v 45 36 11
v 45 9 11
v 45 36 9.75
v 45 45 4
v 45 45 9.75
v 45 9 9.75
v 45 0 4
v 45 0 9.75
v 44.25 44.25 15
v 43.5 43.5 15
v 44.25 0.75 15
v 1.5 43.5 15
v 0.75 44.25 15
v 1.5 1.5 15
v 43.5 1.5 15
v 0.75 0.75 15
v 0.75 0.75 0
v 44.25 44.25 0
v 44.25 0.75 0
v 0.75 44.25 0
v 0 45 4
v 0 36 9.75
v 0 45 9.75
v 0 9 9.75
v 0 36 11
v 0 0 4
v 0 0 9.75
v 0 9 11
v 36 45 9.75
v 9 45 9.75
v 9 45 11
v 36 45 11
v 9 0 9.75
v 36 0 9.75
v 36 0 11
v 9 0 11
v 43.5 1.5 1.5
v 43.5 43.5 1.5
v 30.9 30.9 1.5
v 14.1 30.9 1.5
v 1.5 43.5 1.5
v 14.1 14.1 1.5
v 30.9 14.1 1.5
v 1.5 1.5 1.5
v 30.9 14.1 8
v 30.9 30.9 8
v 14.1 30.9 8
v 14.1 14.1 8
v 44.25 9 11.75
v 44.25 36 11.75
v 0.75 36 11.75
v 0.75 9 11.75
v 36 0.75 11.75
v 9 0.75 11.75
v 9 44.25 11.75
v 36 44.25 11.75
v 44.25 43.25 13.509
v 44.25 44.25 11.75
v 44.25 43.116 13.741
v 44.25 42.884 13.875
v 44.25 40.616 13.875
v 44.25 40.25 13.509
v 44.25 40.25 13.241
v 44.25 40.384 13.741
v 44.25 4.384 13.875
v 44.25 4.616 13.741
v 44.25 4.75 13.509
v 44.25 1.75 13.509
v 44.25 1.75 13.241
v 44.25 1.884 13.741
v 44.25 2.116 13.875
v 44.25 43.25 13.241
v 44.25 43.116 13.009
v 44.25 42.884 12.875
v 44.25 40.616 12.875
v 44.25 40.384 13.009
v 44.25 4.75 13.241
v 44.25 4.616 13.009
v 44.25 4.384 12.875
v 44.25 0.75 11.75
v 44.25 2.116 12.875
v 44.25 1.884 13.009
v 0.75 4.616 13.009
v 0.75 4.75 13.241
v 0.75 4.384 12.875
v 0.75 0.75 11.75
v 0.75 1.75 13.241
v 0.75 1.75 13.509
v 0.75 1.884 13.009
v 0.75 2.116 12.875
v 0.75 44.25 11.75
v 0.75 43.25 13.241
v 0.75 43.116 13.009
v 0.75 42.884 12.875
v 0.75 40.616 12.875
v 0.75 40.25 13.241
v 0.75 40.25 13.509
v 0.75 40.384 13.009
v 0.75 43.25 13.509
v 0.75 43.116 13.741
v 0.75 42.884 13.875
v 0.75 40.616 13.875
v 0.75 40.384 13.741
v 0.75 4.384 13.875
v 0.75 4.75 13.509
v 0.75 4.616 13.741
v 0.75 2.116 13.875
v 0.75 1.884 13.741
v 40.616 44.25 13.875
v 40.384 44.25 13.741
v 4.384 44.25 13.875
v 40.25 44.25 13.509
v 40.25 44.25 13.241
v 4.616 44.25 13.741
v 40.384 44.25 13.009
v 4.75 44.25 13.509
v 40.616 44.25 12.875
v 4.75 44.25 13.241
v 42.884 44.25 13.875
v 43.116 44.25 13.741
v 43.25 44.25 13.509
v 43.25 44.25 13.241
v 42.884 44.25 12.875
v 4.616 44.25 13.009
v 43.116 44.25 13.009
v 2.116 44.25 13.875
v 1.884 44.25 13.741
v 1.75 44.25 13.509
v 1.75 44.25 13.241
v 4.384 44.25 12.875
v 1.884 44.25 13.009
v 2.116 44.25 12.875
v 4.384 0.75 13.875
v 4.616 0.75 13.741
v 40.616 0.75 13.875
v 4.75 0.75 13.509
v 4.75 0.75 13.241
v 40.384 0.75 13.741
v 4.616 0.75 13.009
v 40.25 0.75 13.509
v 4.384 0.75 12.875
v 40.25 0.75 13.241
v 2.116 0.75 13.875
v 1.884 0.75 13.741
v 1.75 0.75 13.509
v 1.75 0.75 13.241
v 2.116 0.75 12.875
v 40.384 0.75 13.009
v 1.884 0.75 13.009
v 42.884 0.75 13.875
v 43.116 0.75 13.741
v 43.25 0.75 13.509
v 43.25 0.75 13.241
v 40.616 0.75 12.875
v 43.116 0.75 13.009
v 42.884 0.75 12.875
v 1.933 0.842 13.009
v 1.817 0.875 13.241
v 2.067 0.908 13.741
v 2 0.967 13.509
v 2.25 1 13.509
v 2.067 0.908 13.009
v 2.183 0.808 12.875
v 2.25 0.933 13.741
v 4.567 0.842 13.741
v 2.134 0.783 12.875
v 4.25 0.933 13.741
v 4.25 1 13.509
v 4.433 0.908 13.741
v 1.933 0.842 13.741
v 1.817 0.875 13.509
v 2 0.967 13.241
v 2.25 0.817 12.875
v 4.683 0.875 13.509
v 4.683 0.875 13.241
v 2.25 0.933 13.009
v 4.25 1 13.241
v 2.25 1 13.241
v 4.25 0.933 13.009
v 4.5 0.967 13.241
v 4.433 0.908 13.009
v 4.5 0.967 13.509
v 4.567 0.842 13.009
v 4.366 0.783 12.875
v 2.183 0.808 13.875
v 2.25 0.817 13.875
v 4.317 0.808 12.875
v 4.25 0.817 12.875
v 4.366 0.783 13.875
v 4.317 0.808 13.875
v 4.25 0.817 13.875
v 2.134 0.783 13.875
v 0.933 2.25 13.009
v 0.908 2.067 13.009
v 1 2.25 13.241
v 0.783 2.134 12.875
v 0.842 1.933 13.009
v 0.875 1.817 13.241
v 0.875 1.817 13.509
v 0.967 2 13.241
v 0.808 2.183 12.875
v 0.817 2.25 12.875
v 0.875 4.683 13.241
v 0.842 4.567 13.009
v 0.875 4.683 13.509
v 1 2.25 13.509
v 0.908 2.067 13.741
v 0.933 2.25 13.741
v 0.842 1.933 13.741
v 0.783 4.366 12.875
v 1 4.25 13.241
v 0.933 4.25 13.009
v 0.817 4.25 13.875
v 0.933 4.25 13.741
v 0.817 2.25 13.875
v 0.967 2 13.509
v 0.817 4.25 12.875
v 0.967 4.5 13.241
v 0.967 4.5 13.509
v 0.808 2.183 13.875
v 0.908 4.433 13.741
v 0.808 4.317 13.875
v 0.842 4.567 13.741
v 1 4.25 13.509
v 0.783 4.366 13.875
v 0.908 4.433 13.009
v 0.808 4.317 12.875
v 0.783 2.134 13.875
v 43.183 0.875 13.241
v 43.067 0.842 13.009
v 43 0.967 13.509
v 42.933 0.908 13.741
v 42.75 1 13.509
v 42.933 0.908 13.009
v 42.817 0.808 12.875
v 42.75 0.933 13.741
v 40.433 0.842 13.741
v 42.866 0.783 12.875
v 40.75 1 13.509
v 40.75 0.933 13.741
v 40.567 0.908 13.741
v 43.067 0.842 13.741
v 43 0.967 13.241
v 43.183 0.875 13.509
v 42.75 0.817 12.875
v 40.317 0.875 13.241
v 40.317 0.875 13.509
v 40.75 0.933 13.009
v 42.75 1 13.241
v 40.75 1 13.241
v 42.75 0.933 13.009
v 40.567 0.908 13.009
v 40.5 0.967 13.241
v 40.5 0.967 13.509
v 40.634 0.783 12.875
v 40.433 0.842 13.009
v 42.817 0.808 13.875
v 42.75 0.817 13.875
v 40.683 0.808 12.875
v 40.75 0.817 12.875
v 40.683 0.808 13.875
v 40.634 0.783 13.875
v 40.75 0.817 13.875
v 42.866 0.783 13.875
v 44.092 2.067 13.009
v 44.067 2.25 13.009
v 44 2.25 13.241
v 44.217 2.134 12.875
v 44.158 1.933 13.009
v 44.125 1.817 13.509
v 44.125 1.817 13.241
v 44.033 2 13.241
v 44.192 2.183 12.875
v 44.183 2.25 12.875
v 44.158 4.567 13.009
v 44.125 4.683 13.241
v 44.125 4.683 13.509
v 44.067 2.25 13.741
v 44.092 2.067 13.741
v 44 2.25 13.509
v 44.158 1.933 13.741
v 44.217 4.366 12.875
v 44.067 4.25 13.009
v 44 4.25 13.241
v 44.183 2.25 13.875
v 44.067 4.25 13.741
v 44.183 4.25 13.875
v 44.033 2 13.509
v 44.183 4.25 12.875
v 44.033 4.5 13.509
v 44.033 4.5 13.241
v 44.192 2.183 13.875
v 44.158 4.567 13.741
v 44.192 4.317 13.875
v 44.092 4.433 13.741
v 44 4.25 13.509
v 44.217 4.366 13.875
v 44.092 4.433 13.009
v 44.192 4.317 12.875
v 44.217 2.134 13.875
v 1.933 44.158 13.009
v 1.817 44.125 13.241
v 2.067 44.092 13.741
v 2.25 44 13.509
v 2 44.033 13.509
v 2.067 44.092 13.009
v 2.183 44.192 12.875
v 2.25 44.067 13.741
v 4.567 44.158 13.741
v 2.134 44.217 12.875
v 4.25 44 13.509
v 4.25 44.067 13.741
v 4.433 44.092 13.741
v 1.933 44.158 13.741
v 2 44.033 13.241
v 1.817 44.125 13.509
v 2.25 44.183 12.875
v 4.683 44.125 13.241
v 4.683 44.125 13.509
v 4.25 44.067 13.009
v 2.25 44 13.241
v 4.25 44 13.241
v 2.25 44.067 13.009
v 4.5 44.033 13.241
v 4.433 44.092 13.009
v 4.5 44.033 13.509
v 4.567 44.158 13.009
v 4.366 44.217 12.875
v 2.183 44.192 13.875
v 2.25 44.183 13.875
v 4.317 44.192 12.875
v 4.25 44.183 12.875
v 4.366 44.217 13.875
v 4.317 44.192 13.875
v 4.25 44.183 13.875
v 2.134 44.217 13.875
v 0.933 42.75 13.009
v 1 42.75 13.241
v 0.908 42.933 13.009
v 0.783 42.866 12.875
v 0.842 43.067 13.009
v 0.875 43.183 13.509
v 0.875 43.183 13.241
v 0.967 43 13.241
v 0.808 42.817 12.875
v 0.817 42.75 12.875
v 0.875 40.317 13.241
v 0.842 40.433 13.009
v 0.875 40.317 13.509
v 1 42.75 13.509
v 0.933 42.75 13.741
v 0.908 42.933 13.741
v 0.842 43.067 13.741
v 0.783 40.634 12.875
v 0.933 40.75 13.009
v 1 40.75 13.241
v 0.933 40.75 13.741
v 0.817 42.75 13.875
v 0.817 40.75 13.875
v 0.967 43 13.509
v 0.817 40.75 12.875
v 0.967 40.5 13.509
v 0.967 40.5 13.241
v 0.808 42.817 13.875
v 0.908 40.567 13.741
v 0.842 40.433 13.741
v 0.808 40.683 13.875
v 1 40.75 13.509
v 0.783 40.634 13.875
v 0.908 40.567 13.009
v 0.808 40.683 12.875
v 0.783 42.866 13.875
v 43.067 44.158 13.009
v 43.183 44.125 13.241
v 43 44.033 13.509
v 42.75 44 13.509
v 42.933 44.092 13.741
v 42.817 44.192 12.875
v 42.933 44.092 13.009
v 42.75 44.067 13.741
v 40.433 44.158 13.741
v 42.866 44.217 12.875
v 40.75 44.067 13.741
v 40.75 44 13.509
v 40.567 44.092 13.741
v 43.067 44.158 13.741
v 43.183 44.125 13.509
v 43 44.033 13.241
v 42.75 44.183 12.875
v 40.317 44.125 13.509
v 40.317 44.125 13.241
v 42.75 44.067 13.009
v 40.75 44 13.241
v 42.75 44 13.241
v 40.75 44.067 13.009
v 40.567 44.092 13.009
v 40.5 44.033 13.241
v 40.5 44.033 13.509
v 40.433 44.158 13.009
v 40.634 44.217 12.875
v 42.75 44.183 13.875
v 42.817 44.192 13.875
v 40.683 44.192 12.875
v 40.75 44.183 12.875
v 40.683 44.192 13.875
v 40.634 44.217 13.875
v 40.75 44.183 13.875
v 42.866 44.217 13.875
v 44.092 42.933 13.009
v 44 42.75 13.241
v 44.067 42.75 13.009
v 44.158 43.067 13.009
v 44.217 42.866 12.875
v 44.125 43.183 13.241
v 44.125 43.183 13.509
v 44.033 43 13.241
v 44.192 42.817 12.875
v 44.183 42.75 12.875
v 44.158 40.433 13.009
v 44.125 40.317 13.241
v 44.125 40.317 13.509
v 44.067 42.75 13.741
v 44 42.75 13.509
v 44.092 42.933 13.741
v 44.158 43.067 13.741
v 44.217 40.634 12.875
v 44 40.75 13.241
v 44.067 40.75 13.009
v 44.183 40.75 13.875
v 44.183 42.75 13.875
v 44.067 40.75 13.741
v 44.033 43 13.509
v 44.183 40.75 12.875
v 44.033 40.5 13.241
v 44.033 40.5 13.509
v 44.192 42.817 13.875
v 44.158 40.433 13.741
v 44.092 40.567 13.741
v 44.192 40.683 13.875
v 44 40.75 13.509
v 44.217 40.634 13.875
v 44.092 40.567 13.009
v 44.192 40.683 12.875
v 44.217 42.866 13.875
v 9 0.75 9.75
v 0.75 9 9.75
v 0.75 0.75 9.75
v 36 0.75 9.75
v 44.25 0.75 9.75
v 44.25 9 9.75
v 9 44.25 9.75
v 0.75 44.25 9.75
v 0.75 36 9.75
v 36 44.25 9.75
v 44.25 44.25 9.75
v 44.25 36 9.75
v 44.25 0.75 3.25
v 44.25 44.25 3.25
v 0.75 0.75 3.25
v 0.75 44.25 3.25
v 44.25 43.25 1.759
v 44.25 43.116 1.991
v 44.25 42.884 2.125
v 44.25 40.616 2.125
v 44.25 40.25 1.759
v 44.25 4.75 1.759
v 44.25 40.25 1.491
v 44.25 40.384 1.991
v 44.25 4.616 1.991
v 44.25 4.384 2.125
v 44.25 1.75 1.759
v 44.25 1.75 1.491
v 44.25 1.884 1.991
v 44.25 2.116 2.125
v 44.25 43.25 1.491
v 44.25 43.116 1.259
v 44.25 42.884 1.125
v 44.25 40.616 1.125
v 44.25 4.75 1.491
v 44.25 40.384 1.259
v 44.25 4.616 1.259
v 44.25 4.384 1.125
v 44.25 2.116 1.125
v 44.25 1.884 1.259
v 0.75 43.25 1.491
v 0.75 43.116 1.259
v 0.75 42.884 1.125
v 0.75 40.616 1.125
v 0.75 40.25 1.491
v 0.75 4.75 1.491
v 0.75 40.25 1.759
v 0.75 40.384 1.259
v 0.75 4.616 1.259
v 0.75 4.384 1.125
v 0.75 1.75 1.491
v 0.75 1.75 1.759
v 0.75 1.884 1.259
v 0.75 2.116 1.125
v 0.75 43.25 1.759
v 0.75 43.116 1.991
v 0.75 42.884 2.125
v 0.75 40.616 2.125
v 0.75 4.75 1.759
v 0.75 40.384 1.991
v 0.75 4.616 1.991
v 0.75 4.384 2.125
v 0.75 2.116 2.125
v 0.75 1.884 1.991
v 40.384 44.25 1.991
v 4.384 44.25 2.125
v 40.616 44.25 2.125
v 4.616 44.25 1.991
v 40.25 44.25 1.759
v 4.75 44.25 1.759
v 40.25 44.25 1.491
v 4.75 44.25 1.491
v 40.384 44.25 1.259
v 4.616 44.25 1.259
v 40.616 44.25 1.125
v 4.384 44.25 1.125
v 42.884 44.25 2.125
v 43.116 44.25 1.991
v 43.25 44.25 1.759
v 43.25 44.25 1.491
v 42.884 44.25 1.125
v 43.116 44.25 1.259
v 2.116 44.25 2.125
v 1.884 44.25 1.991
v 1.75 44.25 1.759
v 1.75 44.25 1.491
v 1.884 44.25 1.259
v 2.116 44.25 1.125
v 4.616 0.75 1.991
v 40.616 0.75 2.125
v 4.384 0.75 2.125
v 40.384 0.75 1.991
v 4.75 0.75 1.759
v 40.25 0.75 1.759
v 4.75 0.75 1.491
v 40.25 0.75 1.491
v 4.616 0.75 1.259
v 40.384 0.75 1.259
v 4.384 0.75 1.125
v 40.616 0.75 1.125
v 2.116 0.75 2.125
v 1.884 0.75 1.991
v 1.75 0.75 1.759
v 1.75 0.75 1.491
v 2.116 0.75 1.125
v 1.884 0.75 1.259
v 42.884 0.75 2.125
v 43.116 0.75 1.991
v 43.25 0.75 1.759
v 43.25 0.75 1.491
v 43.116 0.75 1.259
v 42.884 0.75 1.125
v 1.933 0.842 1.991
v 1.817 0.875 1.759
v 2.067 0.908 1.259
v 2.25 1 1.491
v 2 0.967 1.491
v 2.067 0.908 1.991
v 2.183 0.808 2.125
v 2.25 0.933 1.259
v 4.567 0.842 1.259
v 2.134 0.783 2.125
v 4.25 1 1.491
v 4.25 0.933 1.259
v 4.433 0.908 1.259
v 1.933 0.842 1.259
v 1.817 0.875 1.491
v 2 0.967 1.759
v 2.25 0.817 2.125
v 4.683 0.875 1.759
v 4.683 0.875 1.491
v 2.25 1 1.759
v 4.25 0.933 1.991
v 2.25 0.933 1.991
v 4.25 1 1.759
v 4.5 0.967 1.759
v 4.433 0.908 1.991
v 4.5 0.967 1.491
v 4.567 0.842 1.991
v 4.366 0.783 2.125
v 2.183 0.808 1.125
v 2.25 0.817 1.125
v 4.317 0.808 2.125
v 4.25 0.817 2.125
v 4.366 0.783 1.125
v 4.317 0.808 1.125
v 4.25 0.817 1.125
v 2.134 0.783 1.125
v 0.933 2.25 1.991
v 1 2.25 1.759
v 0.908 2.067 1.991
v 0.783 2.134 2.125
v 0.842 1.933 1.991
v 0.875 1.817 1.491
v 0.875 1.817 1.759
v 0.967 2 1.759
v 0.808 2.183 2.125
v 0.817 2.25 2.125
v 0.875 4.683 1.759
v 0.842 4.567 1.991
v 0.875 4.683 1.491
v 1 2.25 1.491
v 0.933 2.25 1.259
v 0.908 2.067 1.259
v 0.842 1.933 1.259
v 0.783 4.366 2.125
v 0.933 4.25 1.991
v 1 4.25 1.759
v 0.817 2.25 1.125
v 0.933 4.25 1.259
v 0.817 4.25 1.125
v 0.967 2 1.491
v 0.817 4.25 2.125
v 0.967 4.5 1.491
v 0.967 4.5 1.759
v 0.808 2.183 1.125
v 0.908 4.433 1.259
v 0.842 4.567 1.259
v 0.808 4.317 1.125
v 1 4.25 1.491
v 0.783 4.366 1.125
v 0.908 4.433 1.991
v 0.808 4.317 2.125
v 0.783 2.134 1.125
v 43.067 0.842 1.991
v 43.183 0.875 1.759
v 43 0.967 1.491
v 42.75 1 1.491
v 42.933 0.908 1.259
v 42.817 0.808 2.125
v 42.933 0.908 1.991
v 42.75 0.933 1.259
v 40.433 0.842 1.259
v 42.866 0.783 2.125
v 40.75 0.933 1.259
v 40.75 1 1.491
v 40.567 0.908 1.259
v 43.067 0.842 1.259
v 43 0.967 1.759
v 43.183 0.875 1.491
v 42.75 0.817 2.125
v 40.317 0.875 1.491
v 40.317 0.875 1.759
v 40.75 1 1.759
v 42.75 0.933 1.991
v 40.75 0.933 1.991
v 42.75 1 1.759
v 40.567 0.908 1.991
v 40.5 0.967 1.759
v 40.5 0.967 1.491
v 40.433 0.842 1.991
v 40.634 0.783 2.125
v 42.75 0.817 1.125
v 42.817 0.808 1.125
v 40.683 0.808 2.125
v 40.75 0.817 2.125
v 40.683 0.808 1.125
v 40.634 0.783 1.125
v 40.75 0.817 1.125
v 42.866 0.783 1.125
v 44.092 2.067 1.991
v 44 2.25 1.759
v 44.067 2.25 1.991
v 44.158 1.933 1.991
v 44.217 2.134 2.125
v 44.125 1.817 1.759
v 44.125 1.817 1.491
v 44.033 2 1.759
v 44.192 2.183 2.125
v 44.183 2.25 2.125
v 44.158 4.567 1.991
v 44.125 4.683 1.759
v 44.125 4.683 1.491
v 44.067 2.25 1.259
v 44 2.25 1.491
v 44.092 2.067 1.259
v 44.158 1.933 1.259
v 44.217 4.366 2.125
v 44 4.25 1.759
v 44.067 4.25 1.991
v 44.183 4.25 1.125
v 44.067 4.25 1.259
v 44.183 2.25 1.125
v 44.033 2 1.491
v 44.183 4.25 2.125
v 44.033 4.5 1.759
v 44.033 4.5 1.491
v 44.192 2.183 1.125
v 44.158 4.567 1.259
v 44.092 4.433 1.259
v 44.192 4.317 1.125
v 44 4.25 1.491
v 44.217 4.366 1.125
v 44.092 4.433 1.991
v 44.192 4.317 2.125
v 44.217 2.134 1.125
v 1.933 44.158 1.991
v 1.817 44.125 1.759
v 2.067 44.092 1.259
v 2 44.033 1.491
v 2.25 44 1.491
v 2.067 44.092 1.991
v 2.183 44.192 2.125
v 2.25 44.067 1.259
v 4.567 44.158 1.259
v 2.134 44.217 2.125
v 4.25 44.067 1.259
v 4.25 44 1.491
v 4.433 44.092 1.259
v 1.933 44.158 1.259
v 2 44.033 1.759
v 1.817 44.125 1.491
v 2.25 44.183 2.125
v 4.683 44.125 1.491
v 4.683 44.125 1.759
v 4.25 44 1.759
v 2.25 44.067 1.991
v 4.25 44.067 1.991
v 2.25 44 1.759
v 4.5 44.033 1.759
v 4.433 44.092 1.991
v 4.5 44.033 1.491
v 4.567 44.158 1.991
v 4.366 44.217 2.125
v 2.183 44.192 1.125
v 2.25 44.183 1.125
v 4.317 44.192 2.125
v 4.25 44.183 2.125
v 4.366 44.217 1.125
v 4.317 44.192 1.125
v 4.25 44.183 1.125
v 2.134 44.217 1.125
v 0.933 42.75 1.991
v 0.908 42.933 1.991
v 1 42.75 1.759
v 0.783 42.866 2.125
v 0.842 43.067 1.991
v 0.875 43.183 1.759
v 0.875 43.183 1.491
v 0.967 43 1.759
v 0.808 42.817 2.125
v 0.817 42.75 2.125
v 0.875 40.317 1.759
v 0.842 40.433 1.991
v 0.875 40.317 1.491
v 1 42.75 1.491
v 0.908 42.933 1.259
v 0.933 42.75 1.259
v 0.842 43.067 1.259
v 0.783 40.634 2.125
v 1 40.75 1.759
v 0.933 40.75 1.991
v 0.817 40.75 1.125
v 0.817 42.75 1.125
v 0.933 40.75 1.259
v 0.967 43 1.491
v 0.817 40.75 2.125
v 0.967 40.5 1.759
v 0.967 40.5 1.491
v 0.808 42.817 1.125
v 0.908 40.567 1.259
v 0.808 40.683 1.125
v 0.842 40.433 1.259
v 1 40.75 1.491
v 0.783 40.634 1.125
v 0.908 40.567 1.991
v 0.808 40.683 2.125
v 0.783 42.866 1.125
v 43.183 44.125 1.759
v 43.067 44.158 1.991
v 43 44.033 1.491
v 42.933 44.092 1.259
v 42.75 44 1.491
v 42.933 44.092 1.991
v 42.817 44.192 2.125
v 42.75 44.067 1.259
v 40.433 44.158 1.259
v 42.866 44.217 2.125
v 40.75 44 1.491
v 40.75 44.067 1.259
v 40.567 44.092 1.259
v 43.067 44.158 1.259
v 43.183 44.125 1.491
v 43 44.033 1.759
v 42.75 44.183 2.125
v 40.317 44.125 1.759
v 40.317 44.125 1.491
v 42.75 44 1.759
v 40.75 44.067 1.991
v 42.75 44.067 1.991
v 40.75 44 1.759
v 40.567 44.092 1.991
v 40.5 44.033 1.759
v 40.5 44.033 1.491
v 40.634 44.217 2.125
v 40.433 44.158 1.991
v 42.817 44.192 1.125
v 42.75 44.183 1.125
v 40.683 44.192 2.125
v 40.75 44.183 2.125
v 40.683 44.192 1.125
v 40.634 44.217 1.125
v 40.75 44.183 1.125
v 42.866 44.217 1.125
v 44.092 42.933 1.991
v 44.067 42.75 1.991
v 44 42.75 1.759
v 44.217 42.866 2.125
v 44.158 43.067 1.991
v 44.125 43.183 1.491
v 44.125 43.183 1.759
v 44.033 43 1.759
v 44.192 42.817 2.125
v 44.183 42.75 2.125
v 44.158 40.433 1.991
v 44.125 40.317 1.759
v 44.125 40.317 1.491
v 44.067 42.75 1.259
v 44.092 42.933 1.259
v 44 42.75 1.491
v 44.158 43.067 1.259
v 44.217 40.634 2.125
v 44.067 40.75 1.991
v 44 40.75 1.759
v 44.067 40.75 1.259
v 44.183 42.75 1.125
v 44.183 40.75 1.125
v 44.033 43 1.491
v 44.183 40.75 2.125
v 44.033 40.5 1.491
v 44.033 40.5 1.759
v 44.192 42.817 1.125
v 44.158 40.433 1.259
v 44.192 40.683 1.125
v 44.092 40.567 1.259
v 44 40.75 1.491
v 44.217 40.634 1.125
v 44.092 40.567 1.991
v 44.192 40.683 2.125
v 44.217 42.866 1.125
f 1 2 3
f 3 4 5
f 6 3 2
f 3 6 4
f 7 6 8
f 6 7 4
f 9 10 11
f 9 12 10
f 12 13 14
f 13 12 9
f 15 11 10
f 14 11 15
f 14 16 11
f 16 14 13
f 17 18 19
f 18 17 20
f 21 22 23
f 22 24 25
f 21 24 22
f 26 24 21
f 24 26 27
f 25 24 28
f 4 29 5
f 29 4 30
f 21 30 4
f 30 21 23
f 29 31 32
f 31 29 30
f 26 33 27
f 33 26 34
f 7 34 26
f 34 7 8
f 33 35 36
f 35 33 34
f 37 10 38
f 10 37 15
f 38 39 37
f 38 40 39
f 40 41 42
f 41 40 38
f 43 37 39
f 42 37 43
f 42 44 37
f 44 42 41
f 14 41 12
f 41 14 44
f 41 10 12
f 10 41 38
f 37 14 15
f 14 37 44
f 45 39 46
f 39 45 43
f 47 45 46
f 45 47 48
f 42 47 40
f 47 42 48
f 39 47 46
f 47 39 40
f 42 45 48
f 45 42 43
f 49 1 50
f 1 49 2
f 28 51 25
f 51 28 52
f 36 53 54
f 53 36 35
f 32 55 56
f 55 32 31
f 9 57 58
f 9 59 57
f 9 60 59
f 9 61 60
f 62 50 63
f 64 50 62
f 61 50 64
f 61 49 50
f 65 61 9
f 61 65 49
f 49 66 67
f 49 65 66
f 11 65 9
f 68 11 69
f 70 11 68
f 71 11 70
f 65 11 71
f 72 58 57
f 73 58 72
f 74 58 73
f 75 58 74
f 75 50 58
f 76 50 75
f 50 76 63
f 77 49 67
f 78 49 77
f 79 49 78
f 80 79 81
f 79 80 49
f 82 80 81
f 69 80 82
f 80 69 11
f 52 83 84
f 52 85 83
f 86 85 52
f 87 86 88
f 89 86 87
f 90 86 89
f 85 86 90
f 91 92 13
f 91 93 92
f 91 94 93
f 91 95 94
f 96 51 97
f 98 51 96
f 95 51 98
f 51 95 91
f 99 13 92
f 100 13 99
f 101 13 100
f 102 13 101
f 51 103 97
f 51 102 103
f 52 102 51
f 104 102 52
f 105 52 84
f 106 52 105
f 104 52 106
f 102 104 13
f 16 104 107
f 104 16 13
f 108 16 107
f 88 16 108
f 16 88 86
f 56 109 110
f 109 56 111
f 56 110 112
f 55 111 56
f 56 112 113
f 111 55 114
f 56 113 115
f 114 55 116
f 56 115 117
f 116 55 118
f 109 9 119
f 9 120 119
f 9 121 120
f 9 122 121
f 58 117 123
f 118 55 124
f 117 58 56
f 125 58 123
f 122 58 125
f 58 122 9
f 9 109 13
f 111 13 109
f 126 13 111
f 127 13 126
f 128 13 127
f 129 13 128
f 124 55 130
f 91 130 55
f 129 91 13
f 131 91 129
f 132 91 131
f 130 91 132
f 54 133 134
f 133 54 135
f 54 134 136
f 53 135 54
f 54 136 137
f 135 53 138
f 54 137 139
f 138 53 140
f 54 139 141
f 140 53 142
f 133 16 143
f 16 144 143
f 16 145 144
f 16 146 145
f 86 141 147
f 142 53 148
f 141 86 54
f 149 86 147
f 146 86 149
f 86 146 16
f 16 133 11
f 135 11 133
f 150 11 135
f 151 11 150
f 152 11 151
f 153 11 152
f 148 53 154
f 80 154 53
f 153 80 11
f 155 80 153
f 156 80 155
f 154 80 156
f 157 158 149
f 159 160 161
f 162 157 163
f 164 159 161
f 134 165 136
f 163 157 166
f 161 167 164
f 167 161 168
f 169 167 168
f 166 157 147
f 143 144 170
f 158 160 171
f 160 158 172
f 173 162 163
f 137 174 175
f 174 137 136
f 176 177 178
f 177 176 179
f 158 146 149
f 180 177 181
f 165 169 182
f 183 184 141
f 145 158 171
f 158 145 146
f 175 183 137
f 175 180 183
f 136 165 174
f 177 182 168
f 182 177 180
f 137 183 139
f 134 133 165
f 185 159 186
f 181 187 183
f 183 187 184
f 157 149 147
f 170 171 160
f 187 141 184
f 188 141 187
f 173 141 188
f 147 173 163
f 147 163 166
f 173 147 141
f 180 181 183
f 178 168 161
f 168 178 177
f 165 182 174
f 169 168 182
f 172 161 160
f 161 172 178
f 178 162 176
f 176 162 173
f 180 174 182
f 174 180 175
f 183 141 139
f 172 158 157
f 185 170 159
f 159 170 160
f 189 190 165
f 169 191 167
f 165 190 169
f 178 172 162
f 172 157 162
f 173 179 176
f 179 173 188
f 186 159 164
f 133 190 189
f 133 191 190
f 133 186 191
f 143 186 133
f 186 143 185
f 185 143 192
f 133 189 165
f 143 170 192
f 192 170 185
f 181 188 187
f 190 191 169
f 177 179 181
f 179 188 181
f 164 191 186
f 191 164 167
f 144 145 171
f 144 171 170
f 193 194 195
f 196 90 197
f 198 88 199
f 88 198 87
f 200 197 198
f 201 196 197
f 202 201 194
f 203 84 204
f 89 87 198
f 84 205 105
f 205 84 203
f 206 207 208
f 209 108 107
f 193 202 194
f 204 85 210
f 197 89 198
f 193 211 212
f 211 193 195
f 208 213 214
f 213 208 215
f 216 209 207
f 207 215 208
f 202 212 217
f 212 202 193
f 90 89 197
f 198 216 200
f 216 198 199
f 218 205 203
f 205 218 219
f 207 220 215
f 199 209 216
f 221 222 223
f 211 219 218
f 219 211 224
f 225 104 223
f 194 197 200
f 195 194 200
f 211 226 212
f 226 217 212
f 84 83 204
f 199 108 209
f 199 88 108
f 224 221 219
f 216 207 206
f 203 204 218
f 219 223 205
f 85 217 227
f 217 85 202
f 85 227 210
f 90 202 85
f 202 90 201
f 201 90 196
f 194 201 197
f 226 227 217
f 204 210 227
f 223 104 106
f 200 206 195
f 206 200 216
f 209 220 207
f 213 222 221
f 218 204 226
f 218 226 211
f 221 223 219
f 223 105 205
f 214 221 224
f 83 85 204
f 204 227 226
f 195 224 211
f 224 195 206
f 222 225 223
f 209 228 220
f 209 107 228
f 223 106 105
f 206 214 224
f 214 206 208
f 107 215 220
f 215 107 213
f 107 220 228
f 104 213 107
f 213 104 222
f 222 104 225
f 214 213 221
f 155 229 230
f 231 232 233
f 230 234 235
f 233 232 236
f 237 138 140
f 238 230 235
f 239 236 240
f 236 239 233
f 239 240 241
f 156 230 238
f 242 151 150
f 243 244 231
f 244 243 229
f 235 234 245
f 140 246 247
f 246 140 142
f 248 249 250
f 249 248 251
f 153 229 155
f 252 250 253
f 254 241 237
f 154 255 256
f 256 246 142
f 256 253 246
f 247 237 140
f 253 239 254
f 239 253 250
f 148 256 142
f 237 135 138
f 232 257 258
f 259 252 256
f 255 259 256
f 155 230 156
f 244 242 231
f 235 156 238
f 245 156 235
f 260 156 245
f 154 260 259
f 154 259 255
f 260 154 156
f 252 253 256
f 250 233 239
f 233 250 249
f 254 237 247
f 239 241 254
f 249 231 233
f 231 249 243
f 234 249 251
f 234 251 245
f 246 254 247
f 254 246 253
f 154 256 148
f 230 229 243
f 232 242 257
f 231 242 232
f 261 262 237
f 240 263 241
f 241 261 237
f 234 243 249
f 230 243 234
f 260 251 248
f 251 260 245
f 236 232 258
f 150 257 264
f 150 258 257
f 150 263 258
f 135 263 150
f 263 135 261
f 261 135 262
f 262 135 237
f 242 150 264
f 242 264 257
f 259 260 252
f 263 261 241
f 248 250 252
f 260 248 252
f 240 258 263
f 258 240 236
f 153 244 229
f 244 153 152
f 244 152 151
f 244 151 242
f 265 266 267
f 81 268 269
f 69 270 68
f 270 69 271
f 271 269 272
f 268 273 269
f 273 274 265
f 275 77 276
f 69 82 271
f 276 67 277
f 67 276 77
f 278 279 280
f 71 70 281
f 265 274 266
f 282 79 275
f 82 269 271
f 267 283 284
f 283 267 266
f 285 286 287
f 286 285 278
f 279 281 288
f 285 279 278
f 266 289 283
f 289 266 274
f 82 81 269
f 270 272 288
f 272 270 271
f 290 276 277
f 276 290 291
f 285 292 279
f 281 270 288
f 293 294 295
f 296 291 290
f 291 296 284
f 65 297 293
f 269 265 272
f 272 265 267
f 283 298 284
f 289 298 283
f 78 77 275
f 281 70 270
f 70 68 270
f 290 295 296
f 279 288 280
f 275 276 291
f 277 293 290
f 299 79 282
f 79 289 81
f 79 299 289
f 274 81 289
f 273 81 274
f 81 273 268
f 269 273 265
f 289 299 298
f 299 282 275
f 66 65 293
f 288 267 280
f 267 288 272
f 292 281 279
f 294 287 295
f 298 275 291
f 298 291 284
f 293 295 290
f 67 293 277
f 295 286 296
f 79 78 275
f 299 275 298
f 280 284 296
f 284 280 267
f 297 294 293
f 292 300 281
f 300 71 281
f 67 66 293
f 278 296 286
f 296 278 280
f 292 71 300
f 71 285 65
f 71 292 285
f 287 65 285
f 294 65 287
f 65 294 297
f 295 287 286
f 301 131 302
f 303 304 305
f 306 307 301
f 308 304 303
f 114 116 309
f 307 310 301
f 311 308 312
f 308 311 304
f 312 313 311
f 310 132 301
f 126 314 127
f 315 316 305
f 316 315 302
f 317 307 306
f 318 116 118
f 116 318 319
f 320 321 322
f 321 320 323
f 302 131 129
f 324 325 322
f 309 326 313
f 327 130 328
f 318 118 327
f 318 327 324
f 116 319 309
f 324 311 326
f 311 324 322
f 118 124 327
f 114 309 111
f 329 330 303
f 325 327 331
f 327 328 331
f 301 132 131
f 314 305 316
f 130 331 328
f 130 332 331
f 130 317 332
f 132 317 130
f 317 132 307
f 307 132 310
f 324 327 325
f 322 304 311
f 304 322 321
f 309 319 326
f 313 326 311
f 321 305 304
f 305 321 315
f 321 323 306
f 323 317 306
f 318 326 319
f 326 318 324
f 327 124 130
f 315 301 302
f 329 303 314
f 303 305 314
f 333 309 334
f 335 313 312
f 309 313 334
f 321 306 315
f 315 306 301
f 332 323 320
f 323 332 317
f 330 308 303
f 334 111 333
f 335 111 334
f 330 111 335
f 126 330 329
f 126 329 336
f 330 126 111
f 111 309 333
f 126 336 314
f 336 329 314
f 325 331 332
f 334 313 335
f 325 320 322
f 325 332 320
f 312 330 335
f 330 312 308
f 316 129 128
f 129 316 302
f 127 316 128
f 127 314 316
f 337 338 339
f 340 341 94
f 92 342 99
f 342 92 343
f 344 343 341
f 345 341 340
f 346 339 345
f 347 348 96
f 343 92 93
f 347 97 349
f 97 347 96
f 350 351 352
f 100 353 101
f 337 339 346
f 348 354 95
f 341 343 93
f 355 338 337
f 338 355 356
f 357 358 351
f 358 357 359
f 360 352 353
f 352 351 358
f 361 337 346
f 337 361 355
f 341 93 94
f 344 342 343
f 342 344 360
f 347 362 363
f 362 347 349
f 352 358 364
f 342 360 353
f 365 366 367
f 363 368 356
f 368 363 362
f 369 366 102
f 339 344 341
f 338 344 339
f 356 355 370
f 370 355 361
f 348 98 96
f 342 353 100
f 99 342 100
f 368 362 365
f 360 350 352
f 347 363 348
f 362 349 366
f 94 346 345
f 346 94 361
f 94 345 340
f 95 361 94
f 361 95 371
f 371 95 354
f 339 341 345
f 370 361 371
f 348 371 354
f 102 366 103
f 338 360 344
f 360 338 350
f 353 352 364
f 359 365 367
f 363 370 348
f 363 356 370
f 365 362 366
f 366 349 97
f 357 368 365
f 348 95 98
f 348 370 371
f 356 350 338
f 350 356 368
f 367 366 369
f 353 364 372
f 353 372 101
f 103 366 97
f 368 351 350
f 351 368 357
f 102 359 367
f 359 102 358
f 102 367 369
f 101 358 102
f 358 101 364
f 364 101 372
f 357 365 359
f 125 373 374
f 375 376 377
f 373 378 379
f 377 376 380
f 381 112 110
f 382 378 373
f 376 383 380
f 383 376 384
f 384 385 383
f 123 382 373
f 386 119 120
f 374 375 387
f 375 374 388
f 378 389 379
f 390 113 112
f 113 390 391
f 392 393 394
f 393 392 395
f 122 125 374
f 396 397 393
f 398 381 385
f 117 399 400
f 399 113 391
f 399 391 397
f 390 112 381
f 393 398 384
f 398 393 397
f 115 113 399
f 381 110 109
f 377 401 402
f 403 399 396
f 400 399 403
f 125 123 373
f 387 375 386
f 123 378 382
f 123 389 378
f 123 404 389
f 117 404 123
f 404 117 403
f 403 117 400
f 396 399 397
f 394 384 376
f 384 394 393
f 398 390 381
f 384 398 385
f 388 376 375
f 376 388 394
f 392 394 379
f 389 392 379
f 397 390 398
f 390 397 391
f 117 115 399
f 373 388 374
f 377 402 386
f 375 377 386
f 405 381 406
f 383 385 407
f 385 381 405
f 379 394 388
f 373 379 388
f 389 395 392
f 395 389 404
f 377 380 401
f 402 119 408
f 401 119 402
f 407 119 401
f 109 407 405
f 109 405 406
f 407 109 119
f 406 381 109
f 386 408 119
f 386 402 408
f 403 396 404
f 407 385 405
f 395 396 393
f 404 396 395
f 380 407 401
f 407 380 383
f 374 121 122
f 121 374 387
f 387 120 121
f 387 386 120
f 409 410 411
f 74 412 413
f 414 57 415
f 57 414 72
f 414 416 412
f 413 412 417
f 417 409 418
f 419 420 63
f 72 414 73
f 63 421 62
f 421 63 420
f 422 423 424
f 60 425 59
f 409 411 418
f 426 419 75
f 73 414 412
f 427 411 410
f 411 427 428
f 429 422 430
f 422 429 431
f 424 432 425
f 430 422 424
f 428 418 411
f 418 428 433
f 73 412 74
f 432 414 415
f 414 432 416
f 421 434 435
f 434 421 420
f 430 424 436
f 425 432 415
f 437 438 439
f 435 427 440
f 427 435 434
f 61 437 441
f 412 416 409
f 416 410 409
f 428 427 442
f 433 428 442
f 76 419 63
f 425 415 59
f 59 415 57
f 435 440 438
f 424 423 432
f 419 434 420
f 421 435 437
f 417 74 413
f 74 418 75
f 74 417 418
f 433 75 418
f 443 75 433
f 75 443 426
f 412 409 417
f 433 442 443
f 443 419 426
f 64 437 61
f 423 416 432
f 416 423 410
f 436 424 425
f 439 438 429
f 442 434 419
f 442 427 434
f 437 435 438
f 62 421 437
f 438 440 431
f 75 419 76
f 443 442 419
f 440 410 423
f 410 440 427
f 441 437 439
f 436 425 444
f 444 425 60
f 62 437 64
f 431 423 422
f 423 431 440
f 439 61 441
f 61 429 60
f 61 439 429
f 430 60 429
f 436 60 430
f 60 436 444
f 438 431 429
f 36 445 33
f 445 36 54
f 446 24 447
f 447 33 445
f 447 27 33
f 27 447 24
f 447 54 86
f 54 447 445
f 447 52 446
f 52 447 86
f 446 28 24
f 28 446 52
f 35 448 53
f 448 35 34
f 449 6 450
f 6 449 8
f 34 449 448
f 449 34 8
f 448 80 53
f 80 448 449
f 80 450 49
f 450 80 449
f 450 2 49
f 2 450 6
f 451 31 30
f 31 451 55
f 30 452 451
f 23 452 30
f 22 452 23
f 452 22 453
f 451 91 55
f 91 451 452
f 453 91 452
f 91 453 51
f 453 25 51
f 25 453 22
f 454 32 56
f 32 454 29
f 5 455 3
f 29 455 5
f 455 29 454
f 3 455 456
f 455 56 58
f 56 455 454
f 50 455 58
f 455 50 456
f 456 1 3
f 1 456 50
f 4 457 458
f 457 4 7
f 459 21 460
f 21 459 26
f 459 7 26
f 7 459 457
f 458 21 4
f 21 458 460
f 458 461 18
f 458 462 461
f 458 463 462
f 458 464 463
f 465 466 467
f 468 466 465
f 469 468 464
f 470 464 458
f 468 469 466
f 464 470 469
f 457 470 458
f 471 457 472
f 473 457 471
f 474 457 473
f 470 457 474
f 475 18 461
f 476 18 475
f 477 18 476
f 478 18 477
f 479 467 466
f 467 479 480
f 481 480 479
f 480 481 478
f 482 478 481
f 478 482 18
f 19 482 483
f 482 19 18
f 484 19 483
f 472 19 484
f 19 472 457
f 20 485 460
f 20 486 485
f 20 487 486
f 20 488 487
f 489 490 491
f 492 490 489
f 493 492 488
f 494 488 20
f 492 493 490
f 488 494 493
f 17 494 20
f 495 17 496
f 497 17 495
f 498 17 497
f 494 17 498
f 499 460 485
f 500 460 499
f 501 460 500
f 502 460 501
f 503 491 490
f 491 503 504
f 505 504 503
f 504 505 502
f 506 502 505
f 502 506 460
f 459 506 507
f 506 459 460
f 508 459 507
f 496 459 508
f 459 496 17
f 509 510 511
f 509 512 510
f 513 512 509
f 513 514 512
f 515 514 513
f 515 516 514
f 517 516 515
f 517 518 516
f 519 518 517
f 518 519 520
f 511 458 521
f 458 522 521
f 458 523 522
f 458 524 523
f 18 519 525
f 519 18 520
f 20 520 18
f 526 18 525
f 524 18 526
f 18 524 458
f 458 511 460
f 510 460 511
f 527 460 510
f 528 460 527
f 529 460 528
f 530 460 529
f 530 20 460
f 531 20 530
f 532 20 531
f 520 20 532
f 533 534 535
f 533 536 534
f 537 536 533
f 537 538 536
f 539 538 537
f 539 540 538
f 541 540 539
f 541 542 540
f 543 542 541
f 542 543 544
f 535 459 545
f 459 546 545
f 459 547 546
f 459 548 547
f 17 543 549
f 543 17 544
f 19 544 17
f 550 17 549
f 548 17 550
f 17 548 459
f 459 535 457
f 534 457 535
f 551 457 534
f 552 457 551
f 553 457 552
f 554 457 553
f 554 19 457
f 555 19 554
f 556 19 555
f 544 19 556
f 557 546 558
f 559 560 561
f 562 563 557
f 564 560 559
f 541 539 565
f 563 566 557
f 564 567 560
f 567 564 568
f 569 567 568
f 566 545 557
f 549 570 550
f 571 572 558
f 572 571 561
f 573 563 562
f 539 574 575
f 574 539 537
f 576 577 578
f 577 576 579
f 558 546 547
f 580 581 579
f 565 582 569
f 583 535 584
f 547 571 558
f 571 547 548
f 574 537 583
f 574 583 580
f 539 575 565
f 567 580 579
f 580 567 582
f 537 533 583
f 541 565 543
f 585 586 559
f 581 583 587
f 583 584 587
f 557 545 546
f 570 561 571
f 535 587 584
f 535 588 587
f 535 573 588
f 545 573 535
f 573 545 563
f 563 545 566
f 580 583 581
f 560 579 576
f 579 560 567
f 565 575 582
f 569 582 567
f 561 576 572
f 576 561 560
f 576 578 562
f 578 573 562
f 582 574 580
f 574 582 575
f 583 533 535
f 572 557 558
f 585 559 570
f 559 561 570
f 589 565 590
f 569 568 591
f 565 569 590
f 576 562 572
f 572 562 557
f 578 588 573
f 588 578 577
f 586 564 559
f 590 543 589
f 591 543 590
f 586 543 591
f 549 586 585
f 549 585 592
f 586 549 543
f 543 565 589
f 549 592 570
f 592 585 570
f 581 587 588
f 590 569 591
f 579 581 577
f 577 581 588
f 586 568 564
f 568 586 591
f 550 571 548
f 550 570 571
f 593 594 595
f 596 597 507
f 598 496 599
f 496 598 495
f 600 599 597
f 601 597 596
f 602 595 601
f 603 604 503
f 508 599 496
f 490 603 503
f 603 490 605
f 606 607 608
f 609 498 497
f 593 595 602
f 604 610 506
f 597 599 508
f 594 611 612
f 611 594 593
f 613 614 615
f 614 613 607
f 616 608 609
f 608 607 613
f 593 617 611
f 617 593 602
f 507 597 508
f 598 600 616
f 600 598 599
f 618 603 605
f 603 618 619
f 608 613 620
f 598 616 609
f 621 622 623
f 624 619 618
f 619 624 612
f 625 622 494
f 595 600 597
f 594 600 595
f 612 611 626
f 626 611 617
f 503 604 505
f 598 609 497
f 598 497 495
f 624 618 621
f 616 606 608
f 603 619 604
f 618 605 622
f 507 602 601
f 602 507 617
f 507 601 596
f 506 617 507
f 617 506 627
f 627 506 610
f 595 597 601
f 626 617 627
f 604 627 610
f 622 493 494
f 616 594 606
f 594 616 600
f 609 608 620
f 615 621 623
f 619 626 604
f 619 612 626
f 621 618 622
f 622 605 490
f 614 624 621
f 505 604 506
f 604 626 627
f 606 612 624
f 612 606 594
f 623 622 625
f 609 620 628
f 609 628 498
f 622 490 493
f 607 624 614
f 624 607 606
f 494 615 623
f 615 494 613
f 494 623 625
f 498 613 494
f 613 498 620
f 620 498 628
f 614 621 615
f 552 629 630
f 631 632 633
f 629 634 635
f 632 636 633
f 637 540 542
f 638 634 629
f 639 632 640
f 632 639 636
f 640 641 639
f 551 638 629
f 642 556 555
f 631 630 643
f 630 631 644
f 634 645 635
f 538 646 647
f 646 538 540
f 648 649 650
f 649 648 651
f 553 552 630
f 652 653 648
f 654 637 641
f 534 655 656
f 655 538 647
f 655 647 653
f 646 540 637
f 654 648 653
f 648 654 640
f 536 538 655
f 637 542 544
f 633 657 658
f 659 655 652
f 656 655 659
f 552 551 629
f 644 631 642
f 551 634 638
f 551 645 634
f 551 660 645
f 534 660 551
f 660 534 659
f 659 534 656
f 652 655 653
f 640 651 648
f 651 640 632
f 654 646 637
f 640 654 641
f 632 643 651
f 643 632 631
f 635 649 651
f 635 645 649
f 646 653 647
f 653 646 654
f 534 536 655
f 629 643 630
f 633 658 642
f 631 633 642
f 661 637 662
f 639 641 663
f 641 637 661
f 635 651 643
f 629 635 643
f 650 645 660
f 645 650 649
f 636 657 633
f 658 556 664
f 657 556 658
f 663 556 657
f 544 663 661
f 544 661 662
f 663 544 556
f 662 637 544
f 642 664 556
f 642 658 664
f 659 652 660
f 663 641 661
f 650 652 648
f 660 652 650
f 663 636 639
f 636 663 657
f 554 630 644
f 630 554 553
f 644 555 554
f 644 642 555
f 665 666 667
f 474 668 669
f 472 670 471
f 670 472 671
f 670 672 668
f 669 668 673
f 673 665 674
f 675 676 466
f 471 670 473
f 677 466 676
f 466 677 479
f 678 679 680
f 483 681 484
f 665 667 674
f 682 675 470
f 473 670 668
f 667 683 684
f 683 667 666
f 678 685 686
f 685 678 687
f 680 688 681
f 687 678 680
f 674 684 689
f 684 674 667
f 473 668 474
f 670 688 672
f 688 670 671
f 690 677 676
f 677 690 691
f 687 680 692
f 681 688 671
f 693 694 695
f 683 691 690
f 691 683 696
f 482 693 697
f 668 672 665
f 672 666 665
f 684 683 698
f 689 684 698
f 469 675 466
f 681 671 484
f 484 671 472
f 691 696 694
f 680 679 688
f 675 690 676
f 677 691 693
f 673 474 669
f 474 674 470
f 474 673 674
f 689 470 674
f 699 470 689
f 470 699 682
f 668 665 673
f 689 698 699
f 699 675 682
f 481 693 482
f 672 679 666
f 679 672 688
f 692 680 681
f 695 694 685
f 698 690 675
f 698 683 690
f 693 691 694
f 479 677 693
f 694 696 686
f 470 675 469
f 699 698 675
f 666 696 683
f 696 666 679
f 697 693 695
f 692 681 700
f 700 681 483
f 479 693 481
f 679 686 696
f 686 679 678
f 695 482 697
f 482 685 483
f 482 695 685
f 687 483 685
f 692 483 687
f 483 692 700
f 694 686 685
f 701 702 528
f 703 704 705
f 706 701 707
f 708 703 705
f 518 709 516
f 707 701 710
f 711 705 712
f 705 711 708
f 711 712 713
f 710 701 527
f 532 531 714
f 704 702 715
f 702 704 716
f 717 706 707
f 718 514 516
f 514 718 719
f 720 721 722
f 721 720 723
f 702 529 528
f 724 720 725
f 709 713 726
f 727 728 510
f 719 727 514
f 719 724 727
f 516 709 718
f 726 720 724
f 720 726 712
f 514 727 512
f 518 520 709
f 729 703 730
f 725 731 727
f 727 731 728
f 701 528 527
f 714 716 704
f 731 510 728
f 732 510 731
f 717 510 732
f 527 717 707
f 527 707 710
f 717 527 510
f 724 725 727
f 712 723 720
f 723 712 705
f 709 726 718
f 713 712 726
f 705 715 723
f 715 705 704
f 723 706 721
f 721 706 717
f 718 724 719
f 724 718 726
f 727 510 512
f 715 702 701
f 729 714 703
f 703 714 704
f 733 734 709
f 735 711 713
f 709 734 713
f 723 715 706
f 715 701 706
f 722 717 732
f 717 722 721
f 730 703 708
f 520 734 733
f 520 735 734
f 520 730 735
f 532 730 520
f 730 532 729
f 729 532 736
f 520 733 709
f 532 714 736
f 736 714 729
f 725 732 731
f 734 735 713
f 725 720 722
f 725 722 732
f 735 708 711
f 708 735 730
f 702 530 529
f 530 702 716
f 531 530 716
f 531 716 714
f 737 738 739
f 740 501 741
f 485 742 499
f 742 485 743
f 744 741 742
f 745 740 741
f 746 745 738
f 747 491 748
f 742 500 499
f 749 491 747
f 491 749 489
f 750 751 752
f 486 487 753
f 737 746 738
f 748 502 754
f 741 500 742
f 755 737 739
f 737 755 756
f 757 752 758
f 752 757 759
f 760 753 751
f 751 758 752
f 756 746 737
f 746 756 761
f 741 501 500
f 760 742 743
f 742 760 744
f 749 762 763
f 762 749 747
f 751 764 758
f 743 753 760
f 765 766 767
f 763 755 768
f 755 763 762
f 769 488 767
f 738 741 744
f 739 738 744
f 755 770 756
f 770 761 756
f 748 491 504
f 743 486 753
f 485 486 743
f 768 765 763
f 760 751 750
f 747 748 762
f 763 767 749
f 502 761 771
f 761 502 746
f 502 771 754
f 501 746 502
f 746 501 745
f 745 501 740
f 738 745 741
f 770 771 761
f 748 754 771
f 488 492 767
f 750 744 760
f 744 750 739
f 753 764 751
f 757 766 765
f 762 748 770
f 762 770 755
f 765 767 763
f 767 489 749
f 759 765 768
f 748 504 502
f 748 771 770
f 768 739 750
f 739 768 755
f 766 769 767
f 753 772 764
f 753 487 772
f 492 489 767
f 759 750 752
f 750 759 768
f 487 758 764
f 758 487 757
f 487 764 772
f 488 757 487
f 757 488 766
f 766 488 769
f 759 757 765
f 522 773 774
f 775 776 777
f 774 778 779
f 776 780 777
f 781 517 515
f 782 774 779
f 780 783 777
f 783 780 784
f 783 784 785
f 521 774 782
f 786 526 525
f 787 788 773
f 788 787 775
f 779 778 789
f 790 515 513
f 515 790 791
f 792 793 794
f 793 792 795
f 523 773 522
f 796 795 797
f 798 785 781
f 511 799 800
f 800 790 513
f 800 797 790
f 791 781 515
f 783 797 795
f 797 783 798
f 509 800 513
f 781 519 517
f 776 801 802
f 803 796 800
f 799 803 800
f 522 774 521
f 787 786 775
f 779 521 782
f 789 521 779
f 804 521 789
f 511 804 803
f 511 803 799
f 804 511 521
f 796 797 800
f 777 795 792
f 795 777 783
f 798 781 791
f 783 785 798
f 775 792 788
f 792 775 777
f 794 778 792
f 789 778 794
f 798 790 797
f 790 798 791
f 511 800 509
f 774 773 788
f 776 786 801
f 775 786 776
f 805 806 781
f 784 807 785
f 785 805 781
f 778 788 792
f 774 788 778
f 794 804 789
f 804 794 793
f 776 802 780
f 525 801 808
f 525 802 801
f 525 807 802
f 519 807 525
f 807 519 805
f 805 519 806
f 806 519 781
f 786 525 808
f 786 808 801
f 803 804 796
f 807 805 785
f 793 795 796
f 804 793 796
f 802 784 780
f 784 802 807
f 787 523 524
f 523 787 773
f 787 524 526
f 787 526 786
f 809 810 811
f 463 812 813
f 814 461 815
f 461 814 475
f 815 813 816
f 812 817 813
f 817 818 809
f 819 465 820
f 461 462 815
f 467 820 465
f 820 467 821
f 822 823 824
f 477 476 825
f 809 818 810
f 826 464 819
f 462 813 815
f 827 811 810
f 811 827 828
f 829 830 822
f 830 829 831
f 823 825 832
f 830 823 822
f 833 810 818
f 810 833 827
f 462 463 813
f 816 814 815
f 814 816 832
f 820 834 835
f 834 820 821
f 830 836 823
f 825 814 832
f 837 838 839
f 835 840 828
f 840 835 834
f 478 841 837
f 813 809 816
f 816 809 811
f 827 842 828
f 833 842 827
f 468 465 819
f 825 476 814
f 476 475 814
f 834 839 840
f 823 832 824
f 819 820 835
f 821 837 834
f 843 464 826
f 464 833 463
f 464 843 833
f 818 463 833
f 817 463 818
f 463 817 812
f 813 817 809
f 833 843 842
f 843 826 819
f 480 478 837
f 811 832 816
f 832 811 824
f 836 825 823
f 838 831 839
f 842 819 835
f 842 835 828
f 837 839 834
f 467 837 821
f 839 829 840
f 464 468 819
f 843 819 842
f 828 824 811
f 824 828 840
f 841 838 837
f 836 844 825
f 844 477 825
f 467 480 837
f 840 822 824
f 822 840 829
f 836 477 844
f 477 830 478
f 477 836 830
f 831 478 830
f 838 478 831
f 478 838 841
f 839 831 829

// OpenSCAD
// Test: Pedestal base — FTR_PEDESTAL_BASE_B (push-down feature for cards)
include <../boardgame_insert_toolkit_lib.4.scad>;

g_b_print_lid = false;
g_b_print_box = true;
g_isolated_print_box = "";

data = [
    [ "pedestal base",
        [
            [ BOX_SIZE_XYZ, [45, 45, 15] ],
            [ BOX_FEATURE,
                [
                    [ FTR_COMPARTMENT_SIZE_XYZ, [42, 42, 7] ],
                    [ FTR_PEDESTAL_BASE_B, t ],
                ]
            ]
        ]
    ],
];

MakeAll();
